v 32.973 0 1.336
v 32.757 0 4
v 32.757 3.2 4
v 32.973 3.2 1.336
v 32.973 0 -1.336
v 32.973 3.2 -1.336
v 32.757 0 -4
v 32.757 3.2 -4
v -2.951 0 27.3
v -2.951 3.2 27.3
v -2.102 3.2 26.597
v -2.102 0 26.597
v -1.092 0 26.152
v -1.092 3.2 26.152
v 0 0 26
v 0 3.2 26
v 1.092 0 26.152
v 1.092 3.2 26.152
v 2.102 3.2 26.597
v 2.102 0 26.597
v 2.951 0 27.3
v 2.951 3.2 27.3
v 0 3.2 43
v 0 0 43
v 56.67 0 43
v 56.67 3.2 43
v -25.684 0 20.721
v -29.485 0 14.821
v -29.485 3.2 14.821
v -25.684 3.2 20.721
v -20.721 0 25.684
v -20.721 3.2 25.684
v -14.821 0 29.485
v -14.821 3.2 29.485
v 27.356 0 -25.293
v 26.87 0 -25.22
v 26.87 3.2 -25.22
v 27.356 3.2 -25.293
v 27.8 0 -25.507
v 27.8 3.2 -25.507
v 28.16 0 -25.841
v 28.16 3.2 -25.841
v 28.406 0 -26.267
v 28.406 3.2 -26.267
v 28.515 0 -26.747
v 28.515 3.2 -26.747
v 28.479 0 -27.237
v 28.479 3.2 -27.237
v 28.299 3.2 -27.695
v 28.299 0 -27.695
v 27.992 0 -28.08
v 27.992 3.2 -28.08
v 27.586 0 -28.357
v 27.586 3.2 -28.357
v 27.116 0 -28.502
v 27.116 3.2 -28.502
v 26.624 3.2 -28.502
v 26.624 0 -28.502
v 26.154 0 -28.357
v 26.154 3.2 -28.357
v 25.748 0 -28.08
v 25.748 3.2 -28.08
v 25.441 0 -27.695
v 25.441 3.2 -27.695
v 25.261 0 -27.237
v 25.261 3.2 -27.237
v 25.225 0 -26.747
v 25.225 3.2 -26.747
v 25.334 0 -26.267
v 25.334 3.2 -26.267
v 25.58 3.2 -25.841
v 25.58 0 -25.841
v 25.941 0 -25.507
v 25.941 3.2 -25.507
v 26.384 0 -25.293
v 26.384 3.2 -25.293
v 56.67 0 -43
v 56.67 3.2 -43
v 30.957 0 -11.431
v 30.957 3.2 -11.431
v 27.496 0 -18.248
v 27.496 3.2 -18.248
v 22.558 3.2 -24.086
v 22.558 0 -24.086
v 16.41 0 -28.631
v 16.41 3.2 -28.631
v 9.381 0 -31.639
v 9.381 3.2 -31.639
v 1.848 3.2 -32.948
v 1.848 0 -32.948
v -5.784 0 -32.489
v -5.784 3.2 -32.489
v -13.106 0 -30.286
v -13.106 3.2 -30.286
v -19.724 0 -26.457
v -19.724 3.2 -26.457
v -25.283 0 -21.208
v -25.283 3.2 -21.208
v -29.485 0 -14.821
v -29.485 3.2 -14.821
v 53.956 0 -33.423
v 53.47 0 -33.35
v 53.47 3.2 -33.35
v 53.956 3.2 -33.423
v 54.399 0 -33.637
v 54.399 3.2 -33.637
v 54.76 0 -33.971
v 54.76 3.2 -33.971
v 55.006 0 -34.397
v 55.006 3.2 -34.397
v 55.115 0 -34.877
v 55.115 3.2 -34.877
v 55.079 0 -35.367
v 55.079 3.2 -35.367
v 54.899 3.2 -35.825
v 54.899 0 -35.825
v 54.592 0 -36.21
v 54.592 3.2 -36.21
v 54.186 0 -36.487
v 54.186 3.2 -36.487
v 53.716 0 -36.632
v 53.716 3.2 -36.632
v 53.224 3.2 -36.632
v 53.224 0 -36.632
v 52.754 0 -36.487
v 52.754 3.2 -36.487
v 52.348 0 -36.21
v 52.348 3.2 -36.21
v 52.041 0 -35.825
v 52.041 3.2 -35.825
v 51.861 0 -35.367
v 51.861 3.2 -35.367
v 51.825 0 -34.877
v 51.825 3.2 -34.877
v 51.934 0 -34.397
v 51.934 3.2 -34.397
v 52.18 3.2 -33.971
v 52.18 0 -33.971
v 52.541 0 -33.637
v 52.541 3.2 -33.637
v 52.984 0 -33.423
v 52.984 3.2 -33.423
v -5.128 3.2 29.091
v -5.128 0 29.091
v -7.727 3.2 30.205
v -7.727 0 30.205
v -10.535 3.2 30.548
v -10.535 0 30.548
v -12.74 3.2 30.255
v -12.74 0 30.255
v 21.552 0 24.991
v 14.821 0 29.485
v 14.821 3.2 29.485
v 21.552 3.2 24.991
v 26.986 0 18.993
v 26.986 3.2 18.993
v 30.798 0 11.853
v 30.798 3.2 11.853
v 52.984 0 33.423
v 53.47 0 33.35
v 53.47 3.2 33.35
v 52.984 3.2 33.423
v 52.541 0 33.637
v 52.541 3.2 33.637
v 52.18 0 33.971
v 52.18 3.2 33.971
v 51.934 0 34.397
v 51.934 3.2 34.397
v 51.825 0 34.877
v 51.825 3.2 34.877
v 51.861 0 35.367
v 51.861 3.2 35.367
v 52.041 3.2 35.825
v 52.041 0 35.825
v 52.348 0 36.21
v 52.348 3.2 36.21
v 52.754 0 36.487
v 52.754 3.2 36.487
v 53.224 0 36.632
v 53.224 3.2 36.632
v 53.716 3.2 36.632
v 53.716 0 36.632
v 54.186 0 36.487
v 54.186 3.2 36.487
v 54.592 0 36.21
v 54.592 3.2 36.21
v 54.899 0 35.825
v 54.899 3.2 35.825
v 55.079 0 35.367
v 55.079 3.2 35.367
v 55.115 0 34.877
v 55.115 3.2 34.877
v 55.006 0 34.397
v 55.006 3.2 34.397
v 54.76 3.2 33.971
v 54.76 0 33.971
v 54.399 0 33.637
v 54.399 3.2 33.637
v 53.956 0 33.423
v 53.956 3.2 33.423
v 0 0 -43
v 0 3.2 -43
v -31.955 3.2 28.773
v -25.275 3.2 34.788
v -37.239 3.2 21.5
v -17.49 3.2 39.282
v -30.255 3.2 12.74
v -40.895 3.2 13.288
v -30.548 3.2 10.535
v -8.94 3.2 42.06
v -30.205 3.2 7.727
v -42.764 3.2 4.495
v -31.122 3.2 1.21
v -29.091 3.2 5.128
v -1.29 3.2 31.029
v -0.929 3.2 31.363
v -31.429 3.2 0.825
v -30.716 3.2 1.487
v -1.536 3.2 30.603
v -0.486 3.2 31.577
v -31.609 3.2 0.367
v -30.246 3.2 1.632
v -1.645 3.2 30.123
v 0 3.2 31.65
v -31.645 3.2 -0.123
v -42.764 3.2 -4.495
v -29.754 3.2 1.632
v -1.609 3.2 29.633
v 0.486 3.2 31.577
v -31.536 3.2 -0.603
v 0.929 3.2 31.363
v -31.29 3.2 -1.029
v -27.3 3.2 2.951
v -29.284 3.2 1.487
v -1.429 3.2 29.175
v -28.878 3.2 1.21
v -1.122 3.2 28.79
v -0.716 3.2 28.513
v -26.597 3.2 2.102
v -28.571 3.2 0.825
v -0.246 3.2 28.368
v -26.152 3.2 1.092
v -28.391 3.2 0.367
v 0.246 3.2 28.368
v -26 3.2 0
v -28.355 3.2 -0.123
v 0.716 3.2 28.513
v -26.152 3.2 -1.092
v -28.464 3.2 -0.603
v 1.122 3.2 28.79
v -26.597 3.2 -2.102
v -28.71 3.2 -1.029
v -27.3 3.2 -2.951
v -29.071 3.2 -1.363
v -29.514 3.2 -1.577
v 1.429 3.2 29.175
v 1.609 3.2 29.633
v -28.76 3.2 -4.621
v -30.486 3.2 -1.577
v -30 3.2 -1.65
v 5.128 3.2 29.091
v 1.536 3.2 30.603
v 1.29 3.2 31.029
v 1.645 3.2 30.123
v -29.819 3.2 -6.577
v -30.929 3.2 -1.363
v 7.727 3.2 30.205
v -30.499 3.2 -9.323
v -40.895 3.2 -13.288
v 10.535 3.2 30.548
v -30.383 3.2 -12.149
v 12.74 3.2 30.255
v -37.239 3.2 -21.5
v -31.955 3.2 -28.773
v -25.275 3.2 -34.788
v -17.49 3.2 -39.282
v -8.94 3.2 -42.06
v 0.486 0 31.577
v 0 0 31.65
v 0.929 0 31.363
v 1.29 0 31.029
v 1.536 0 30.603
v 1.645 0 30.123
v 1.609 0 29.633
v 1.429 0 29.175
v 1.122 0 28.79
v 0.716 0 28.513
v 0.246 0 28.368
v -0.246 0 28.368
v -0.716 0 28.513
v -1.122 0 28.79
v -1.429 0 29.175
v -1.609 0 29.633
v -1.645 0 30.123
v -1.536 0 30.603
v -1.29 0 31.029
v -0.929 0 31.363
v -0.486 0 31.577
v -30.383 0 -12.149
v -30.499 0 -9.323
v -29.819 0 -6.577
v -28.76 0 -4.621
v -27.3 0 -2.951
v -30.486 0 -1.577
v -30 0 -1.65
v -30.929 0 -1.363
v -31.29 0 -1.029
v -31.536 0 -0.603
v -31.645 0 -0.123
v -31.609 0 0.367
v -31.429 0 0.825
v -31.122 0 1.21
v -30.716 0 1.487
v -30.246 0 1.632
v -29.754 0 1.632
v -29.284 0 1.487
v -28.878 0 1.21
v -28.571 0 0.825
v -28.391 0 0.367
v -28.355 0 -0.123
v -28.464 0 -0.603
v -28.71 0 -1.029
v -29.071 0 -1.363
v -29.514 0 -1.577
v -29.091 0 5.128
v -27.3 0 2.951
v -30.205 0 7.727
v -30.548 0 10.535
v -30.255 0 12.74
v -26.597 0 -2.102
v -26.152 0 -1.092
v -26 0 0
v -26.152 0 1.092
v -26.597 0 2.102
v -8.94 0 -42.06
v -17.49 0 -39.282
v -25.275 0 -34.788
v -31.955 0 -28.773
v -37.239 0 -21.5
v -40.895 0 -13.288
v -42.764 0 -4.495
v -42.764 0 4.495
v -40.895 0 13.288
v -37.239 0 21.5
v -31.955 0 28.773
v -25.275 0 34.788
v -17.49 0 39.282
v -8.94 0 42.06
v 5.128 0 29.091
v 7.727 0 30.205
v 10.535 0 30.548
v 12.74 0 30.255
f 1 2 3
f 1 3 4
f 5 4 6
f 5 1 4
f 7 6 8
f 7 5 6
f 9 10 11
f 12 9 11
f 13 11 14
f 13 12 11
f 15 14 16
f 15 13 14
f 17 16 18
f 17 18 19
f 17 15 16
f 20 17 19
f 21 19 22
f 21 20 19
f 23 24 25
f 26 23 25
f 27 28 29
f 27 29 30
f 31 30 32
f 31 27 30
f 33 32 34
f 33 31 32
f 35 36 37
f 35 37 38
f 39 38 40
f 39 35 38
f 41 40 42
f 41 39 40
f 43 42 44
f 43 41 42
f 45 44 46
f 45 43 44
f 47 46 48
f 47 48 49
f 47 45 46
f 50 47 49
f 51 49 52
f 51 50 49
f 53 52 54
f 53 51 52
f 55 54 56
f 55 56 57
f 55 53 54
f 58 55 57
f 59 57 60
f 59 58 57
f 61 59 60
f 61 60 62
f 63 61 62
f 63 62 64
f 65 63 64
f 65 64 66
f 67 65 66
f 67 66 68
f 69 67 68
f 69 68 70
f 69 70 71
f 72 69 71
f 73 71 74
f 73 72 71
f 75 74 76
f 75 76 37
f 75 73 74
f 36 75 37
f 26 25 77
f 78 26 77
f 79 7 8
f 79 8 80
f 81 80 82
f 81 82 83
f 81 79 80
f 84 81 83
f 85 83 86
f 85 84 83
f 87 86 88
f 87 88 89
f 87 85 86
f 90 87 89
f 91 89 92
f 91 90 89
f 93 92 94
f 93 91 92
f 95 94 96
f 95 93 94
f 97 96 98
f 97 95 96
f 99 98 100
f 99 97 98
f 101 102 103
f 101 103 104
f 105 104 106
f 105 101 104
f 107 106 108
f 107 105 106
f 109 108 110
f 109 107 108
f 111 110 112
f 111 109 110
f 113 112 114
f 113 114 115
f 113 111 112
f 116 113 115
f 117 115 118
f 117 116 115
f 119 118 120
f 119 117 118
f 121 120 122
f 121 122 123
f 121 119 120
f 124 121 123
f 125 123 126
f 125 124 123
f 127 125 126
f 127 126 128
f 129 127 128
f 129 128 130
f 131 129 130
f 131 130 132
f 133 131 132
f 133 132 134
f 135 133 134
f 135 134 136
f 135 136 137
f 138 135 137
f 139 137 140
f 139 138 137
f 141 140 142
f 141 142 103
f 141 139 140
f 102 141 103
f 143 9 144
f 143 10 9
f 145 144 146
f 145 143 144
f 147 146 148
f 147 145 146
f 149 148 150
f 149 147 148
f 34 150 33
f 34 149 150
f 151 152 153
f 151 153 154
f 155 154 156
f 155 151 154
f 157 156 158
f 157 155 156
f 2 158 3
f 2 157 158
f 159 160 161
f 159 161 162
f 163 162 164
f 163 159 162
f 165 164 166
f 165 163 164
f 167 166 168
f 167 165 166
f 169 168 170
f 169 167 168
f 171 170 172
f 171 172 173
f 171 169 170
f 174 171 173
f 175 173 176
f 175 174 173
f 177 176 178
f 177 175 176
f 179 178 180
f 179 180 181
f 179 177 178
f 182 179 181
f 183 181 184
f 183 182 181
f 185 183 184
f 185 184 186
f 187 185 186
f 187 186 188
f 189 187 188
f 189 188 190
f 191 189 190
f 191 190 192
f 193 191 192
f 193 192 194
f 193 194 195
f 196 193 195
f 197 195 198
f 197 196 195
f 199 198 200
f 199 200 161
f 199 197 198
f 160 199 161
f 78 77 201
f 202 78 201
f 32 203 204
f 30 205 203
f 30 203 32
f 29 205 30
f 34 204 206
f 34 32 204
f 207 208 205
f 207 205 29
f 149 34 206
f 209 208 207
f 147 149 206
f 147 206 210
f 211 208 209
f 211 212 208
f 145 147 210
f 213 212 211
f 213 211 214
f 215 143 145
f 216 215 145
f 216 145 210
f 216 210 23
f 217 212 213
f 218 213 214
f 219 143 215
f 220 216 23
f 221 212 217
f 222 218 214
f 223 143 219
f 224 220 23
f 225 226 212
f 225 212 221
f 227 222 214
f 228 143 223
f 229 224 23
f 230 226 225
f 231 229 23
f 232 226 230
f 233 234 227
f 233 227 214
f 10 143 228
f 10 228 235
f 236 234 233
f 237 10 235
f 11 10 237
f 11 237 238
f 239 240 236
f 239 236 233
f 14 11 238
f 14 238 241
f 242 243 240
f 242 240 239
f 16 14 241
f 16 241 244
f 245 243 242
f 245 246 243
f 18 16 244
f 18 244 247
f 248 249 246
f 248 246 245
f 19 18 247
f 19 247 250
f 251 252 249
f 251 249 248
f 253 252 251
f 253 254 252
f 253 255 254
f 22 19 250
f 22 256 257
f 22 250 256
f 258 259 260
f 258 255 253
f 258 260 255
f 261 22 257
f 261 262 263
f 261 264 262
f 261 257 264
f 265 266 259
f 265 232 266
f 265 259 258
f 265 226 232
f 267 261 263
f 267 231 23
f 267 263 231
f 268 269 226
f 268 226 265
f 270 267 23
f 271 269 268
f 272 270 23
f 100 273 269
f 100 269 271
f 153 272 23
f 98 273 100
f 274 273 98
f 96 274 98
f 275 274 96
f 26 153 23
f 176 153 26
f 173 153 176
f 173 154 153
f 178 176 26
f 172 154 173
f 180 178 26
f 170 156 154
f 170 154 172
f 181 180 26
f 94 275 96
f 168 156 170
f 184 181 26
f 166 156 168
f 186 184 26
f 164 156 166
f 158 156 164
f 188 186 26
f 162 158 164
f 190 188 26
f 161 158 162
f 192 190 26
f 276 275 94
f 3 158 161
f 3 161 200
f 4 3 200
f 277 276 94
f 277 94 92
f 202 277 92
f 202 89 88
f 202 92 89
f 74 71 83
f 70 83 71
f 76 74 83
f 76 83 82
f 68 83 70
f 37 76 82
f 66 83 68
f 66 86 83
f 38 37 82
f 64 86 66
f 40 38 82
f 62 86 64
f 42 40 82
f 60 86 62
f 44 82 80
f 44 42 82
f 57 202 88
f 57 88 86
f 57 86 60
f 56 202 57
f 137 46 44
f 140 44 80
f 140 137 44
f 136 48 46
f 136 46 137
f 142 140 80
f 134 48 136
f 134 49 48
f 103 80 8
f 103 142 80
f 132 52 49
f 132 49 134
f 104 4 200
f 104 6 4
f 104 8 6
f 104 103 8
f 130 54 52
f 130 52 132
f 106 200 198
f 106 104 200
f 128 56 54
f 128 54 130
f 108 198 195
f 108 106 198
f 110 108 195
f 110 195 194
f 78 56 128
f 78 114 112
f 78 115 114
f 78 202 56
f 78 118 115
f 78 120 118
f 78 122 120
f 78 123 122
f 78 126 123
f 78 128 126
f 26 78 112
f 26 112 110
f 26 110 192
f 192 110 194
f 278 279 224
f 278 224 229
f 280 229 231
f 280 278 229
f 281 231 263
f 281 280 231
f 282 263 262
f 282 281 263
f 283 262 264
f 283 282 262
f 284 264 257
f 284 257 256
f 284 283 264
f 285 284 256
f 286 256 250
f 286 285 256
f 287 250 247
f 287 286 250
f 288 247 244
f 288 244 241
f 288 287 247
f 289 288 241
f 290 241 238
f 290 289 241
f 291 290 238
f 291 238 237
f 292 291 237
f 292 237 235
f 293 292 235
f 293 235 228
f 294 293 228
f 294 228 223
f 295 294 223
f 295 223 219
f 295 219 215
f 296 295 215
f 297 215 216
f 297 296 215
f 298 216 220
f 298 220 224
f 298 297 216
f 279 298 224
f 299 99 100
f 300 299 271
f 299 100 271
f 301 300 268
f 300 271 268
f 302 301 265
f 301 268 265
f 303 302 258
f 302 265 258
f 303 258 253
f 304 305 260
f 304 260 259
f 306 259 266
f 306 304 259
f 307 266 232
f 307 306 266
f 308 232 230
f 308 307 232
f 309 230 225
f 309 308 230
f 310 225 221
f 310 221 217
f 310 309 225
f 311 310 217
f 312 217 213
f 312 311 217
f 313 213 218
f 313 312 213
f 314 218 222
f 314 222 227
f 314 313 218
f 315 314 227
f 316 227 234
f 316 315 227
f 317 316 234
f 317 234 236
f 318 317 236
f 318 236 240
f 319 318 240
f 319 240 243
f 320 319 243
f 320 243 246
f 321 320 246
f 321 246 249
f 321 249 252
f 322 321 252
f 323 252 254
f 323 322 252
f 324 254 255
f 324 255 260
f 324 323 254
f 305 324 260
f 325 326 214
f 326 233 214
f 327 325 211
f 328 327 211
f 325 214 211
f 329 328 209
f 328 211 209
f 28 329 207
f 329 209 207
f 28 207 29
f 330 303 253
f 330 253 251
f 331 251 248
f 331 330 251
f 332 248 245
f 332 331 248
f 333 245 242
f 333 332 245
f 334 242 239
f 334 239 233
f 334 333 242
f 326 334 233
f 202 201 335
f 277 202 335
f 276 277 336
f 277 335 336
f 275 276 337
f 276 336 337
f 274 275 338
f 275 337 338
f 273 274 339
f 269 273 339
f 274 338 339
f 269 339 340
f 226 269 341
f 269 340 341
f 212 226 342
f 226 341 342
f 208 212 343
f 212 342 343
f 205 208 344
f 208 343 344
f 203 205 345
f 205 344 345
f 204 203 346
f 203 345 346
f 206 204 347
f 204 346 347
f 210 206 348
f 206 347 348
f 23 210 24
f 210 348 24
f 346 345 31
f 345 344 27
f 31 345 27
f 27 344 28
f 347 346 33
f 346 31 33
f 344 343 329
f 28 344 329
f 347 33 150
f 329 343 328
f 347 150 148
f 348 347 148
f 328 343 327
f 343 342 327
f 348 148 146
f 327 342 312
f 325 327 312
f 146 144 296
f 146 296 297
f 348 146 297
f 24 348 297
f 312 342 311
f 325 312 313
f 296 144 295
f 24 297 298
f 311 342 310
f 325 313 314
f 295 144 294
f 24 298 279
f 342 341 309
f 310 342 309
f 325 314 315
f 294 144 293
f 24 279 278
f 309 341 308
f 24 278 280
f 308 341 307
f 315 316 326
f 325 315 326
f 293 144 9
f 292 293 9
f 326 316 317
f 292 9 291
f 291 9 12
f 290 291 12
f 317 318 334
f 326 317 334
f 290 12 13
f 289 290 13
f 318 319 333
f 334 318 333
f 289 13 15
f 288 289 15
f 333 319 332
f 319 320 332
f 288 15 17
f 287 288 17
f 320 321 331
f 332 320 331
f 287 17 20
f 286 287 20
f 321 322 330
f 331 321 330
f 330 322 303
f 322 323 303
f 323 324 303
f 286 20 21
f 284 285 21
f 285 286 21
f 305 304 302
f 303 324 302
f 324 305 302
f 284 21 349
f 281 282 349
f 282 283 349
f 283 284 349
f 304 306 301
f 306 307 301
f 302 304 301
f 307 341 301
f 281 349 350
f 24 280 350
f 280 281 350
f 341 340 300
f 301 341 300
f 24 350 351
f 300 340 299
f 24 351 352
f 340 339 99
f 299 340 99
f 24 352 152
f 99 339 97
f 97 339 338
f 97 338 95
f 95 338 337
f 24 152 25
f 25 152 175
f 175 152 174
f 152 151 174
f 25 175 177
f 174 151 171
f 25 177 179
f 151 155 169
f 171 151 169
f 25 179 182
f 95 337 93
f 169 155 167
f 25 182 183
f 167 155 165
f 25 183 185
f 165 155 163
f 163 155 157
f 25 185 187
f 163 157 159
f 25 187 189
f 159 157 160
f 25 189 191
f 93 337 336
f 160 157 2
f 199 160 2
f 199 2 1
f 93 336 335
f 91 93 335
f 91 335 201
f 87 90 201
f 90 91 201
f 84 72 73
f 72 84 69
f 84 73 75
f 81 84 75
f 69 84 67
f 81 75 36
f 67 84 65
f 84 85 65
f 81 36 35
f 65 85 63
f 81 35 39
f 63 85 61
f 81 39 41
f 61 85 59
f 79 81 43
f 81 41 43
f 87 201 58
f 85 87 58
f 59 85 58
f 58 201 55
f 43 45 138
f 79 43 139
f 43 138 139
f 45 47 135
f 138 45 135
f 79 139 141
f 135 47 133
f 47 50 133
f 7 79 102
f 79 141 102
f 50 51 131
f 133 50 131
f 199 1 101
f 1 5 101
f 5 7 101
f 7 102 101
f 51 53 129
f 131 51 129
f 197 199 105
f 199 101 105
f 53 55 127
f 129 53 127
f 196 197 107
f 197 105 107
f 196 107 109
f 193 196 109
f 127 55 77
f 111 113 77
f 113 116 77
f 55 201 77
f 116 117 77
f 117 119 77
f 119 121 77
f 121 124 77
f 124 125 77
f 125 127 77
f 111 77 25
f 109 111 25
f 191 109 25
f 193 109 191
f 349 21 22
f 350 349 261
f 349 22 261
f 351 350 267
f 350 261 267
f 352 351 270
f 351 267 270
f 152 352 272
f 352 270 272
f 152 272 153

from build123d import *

# Parameters (mm, degrees)
SKETCH1_R           = 1.65
BOSS_EXTRUDE1_DEPTH = 3.2
FILLET1_R           = 10


with BuildPart() as part:
    # Sketch1 → Boss-Extrude1 (new body)
    with BuildSketch(Plane(origin=(0, 0, 0), x_dir=(1, 0, 0), z_dir=(0, 1, 0))):
        with BuildLine():
            Line((0, -43), (56.67, -43))
            Line((56.67, -43), (56.67, 43))
            Line((56.67, 43), (0, 43))
            ThreePointArc((0, 43), (-43, 0), (0, -43))
        make_face()
        with Locations(Location((26.870057685, 26.870057685, 0), (0, 0, 270))):
            Circle(SKETCH1_R, mode=Mode.SUBTRACT)
        with Locations(Location((0, -30, 0), (0, 0, 270))):
            Circle(SKETCH1_R, mode=Mode.SUBTRACT)
        with Locations(Location((53.47, 35, 0), (0, 0, 270))):
            Circle(SKETCH1_R, mode=Mode.SUBTRACT)
        with Locations(Location((53.47, -35, 0), (0, 0, 90))):
            Circle(SKETCH1_R, mode=Mode.SUBTRACT)
        with Locations(Location((-30, 0, 0), (0, 0, 90))):
            Circle(SKETCH1_R, mode=Mode.SUBTRACT)
        with BuildLine():
            Line((-4, -32.756678708), (-4, -30))
            ThreePointArc((-4, -30), (0, -26), (4, -30))
            Line((4, -30), (4, -32.756678708))
            ThreePointArc((4, -32.756678708), (23.334523779, -23.334523779), (32.756678708, -4))
            ThreePointArc((32.756678708, -4), (33, 0), (32.756678708, 4))
            ThreePointArc((32.756678708, 4), (0, 33), (-32.756678708, 4))
            Line((-32.756678708, 4), (-30, 4))
            ThreePointArc((-30, 4), (-26, 0), (-30, -4))
            Line((-30, -4), (-32.756678708, -4))
            ThreePointArc((-32.756678708, -4), (-23.334523779, -23.334523779), (-4, -32.756678708))
        make_face(mode=Mode.SUBTRACT)
    extrude(amount=BOSS_EXTRUDE1_DEPTH)

    # Fillet1
    fillet1_edges = [part.edges().sort_by_distance(p)[0] for p in [
        (4, 1.6, 32.756678708),
        (-32.756678708, 1.6, -4),
        (-32.756678708, 1.6, 4),
        (-4, 1.6, 32.756678708),
    ]]
    fillet(fillet1_edges, radius=FILLET1_R)


solid = part.part
